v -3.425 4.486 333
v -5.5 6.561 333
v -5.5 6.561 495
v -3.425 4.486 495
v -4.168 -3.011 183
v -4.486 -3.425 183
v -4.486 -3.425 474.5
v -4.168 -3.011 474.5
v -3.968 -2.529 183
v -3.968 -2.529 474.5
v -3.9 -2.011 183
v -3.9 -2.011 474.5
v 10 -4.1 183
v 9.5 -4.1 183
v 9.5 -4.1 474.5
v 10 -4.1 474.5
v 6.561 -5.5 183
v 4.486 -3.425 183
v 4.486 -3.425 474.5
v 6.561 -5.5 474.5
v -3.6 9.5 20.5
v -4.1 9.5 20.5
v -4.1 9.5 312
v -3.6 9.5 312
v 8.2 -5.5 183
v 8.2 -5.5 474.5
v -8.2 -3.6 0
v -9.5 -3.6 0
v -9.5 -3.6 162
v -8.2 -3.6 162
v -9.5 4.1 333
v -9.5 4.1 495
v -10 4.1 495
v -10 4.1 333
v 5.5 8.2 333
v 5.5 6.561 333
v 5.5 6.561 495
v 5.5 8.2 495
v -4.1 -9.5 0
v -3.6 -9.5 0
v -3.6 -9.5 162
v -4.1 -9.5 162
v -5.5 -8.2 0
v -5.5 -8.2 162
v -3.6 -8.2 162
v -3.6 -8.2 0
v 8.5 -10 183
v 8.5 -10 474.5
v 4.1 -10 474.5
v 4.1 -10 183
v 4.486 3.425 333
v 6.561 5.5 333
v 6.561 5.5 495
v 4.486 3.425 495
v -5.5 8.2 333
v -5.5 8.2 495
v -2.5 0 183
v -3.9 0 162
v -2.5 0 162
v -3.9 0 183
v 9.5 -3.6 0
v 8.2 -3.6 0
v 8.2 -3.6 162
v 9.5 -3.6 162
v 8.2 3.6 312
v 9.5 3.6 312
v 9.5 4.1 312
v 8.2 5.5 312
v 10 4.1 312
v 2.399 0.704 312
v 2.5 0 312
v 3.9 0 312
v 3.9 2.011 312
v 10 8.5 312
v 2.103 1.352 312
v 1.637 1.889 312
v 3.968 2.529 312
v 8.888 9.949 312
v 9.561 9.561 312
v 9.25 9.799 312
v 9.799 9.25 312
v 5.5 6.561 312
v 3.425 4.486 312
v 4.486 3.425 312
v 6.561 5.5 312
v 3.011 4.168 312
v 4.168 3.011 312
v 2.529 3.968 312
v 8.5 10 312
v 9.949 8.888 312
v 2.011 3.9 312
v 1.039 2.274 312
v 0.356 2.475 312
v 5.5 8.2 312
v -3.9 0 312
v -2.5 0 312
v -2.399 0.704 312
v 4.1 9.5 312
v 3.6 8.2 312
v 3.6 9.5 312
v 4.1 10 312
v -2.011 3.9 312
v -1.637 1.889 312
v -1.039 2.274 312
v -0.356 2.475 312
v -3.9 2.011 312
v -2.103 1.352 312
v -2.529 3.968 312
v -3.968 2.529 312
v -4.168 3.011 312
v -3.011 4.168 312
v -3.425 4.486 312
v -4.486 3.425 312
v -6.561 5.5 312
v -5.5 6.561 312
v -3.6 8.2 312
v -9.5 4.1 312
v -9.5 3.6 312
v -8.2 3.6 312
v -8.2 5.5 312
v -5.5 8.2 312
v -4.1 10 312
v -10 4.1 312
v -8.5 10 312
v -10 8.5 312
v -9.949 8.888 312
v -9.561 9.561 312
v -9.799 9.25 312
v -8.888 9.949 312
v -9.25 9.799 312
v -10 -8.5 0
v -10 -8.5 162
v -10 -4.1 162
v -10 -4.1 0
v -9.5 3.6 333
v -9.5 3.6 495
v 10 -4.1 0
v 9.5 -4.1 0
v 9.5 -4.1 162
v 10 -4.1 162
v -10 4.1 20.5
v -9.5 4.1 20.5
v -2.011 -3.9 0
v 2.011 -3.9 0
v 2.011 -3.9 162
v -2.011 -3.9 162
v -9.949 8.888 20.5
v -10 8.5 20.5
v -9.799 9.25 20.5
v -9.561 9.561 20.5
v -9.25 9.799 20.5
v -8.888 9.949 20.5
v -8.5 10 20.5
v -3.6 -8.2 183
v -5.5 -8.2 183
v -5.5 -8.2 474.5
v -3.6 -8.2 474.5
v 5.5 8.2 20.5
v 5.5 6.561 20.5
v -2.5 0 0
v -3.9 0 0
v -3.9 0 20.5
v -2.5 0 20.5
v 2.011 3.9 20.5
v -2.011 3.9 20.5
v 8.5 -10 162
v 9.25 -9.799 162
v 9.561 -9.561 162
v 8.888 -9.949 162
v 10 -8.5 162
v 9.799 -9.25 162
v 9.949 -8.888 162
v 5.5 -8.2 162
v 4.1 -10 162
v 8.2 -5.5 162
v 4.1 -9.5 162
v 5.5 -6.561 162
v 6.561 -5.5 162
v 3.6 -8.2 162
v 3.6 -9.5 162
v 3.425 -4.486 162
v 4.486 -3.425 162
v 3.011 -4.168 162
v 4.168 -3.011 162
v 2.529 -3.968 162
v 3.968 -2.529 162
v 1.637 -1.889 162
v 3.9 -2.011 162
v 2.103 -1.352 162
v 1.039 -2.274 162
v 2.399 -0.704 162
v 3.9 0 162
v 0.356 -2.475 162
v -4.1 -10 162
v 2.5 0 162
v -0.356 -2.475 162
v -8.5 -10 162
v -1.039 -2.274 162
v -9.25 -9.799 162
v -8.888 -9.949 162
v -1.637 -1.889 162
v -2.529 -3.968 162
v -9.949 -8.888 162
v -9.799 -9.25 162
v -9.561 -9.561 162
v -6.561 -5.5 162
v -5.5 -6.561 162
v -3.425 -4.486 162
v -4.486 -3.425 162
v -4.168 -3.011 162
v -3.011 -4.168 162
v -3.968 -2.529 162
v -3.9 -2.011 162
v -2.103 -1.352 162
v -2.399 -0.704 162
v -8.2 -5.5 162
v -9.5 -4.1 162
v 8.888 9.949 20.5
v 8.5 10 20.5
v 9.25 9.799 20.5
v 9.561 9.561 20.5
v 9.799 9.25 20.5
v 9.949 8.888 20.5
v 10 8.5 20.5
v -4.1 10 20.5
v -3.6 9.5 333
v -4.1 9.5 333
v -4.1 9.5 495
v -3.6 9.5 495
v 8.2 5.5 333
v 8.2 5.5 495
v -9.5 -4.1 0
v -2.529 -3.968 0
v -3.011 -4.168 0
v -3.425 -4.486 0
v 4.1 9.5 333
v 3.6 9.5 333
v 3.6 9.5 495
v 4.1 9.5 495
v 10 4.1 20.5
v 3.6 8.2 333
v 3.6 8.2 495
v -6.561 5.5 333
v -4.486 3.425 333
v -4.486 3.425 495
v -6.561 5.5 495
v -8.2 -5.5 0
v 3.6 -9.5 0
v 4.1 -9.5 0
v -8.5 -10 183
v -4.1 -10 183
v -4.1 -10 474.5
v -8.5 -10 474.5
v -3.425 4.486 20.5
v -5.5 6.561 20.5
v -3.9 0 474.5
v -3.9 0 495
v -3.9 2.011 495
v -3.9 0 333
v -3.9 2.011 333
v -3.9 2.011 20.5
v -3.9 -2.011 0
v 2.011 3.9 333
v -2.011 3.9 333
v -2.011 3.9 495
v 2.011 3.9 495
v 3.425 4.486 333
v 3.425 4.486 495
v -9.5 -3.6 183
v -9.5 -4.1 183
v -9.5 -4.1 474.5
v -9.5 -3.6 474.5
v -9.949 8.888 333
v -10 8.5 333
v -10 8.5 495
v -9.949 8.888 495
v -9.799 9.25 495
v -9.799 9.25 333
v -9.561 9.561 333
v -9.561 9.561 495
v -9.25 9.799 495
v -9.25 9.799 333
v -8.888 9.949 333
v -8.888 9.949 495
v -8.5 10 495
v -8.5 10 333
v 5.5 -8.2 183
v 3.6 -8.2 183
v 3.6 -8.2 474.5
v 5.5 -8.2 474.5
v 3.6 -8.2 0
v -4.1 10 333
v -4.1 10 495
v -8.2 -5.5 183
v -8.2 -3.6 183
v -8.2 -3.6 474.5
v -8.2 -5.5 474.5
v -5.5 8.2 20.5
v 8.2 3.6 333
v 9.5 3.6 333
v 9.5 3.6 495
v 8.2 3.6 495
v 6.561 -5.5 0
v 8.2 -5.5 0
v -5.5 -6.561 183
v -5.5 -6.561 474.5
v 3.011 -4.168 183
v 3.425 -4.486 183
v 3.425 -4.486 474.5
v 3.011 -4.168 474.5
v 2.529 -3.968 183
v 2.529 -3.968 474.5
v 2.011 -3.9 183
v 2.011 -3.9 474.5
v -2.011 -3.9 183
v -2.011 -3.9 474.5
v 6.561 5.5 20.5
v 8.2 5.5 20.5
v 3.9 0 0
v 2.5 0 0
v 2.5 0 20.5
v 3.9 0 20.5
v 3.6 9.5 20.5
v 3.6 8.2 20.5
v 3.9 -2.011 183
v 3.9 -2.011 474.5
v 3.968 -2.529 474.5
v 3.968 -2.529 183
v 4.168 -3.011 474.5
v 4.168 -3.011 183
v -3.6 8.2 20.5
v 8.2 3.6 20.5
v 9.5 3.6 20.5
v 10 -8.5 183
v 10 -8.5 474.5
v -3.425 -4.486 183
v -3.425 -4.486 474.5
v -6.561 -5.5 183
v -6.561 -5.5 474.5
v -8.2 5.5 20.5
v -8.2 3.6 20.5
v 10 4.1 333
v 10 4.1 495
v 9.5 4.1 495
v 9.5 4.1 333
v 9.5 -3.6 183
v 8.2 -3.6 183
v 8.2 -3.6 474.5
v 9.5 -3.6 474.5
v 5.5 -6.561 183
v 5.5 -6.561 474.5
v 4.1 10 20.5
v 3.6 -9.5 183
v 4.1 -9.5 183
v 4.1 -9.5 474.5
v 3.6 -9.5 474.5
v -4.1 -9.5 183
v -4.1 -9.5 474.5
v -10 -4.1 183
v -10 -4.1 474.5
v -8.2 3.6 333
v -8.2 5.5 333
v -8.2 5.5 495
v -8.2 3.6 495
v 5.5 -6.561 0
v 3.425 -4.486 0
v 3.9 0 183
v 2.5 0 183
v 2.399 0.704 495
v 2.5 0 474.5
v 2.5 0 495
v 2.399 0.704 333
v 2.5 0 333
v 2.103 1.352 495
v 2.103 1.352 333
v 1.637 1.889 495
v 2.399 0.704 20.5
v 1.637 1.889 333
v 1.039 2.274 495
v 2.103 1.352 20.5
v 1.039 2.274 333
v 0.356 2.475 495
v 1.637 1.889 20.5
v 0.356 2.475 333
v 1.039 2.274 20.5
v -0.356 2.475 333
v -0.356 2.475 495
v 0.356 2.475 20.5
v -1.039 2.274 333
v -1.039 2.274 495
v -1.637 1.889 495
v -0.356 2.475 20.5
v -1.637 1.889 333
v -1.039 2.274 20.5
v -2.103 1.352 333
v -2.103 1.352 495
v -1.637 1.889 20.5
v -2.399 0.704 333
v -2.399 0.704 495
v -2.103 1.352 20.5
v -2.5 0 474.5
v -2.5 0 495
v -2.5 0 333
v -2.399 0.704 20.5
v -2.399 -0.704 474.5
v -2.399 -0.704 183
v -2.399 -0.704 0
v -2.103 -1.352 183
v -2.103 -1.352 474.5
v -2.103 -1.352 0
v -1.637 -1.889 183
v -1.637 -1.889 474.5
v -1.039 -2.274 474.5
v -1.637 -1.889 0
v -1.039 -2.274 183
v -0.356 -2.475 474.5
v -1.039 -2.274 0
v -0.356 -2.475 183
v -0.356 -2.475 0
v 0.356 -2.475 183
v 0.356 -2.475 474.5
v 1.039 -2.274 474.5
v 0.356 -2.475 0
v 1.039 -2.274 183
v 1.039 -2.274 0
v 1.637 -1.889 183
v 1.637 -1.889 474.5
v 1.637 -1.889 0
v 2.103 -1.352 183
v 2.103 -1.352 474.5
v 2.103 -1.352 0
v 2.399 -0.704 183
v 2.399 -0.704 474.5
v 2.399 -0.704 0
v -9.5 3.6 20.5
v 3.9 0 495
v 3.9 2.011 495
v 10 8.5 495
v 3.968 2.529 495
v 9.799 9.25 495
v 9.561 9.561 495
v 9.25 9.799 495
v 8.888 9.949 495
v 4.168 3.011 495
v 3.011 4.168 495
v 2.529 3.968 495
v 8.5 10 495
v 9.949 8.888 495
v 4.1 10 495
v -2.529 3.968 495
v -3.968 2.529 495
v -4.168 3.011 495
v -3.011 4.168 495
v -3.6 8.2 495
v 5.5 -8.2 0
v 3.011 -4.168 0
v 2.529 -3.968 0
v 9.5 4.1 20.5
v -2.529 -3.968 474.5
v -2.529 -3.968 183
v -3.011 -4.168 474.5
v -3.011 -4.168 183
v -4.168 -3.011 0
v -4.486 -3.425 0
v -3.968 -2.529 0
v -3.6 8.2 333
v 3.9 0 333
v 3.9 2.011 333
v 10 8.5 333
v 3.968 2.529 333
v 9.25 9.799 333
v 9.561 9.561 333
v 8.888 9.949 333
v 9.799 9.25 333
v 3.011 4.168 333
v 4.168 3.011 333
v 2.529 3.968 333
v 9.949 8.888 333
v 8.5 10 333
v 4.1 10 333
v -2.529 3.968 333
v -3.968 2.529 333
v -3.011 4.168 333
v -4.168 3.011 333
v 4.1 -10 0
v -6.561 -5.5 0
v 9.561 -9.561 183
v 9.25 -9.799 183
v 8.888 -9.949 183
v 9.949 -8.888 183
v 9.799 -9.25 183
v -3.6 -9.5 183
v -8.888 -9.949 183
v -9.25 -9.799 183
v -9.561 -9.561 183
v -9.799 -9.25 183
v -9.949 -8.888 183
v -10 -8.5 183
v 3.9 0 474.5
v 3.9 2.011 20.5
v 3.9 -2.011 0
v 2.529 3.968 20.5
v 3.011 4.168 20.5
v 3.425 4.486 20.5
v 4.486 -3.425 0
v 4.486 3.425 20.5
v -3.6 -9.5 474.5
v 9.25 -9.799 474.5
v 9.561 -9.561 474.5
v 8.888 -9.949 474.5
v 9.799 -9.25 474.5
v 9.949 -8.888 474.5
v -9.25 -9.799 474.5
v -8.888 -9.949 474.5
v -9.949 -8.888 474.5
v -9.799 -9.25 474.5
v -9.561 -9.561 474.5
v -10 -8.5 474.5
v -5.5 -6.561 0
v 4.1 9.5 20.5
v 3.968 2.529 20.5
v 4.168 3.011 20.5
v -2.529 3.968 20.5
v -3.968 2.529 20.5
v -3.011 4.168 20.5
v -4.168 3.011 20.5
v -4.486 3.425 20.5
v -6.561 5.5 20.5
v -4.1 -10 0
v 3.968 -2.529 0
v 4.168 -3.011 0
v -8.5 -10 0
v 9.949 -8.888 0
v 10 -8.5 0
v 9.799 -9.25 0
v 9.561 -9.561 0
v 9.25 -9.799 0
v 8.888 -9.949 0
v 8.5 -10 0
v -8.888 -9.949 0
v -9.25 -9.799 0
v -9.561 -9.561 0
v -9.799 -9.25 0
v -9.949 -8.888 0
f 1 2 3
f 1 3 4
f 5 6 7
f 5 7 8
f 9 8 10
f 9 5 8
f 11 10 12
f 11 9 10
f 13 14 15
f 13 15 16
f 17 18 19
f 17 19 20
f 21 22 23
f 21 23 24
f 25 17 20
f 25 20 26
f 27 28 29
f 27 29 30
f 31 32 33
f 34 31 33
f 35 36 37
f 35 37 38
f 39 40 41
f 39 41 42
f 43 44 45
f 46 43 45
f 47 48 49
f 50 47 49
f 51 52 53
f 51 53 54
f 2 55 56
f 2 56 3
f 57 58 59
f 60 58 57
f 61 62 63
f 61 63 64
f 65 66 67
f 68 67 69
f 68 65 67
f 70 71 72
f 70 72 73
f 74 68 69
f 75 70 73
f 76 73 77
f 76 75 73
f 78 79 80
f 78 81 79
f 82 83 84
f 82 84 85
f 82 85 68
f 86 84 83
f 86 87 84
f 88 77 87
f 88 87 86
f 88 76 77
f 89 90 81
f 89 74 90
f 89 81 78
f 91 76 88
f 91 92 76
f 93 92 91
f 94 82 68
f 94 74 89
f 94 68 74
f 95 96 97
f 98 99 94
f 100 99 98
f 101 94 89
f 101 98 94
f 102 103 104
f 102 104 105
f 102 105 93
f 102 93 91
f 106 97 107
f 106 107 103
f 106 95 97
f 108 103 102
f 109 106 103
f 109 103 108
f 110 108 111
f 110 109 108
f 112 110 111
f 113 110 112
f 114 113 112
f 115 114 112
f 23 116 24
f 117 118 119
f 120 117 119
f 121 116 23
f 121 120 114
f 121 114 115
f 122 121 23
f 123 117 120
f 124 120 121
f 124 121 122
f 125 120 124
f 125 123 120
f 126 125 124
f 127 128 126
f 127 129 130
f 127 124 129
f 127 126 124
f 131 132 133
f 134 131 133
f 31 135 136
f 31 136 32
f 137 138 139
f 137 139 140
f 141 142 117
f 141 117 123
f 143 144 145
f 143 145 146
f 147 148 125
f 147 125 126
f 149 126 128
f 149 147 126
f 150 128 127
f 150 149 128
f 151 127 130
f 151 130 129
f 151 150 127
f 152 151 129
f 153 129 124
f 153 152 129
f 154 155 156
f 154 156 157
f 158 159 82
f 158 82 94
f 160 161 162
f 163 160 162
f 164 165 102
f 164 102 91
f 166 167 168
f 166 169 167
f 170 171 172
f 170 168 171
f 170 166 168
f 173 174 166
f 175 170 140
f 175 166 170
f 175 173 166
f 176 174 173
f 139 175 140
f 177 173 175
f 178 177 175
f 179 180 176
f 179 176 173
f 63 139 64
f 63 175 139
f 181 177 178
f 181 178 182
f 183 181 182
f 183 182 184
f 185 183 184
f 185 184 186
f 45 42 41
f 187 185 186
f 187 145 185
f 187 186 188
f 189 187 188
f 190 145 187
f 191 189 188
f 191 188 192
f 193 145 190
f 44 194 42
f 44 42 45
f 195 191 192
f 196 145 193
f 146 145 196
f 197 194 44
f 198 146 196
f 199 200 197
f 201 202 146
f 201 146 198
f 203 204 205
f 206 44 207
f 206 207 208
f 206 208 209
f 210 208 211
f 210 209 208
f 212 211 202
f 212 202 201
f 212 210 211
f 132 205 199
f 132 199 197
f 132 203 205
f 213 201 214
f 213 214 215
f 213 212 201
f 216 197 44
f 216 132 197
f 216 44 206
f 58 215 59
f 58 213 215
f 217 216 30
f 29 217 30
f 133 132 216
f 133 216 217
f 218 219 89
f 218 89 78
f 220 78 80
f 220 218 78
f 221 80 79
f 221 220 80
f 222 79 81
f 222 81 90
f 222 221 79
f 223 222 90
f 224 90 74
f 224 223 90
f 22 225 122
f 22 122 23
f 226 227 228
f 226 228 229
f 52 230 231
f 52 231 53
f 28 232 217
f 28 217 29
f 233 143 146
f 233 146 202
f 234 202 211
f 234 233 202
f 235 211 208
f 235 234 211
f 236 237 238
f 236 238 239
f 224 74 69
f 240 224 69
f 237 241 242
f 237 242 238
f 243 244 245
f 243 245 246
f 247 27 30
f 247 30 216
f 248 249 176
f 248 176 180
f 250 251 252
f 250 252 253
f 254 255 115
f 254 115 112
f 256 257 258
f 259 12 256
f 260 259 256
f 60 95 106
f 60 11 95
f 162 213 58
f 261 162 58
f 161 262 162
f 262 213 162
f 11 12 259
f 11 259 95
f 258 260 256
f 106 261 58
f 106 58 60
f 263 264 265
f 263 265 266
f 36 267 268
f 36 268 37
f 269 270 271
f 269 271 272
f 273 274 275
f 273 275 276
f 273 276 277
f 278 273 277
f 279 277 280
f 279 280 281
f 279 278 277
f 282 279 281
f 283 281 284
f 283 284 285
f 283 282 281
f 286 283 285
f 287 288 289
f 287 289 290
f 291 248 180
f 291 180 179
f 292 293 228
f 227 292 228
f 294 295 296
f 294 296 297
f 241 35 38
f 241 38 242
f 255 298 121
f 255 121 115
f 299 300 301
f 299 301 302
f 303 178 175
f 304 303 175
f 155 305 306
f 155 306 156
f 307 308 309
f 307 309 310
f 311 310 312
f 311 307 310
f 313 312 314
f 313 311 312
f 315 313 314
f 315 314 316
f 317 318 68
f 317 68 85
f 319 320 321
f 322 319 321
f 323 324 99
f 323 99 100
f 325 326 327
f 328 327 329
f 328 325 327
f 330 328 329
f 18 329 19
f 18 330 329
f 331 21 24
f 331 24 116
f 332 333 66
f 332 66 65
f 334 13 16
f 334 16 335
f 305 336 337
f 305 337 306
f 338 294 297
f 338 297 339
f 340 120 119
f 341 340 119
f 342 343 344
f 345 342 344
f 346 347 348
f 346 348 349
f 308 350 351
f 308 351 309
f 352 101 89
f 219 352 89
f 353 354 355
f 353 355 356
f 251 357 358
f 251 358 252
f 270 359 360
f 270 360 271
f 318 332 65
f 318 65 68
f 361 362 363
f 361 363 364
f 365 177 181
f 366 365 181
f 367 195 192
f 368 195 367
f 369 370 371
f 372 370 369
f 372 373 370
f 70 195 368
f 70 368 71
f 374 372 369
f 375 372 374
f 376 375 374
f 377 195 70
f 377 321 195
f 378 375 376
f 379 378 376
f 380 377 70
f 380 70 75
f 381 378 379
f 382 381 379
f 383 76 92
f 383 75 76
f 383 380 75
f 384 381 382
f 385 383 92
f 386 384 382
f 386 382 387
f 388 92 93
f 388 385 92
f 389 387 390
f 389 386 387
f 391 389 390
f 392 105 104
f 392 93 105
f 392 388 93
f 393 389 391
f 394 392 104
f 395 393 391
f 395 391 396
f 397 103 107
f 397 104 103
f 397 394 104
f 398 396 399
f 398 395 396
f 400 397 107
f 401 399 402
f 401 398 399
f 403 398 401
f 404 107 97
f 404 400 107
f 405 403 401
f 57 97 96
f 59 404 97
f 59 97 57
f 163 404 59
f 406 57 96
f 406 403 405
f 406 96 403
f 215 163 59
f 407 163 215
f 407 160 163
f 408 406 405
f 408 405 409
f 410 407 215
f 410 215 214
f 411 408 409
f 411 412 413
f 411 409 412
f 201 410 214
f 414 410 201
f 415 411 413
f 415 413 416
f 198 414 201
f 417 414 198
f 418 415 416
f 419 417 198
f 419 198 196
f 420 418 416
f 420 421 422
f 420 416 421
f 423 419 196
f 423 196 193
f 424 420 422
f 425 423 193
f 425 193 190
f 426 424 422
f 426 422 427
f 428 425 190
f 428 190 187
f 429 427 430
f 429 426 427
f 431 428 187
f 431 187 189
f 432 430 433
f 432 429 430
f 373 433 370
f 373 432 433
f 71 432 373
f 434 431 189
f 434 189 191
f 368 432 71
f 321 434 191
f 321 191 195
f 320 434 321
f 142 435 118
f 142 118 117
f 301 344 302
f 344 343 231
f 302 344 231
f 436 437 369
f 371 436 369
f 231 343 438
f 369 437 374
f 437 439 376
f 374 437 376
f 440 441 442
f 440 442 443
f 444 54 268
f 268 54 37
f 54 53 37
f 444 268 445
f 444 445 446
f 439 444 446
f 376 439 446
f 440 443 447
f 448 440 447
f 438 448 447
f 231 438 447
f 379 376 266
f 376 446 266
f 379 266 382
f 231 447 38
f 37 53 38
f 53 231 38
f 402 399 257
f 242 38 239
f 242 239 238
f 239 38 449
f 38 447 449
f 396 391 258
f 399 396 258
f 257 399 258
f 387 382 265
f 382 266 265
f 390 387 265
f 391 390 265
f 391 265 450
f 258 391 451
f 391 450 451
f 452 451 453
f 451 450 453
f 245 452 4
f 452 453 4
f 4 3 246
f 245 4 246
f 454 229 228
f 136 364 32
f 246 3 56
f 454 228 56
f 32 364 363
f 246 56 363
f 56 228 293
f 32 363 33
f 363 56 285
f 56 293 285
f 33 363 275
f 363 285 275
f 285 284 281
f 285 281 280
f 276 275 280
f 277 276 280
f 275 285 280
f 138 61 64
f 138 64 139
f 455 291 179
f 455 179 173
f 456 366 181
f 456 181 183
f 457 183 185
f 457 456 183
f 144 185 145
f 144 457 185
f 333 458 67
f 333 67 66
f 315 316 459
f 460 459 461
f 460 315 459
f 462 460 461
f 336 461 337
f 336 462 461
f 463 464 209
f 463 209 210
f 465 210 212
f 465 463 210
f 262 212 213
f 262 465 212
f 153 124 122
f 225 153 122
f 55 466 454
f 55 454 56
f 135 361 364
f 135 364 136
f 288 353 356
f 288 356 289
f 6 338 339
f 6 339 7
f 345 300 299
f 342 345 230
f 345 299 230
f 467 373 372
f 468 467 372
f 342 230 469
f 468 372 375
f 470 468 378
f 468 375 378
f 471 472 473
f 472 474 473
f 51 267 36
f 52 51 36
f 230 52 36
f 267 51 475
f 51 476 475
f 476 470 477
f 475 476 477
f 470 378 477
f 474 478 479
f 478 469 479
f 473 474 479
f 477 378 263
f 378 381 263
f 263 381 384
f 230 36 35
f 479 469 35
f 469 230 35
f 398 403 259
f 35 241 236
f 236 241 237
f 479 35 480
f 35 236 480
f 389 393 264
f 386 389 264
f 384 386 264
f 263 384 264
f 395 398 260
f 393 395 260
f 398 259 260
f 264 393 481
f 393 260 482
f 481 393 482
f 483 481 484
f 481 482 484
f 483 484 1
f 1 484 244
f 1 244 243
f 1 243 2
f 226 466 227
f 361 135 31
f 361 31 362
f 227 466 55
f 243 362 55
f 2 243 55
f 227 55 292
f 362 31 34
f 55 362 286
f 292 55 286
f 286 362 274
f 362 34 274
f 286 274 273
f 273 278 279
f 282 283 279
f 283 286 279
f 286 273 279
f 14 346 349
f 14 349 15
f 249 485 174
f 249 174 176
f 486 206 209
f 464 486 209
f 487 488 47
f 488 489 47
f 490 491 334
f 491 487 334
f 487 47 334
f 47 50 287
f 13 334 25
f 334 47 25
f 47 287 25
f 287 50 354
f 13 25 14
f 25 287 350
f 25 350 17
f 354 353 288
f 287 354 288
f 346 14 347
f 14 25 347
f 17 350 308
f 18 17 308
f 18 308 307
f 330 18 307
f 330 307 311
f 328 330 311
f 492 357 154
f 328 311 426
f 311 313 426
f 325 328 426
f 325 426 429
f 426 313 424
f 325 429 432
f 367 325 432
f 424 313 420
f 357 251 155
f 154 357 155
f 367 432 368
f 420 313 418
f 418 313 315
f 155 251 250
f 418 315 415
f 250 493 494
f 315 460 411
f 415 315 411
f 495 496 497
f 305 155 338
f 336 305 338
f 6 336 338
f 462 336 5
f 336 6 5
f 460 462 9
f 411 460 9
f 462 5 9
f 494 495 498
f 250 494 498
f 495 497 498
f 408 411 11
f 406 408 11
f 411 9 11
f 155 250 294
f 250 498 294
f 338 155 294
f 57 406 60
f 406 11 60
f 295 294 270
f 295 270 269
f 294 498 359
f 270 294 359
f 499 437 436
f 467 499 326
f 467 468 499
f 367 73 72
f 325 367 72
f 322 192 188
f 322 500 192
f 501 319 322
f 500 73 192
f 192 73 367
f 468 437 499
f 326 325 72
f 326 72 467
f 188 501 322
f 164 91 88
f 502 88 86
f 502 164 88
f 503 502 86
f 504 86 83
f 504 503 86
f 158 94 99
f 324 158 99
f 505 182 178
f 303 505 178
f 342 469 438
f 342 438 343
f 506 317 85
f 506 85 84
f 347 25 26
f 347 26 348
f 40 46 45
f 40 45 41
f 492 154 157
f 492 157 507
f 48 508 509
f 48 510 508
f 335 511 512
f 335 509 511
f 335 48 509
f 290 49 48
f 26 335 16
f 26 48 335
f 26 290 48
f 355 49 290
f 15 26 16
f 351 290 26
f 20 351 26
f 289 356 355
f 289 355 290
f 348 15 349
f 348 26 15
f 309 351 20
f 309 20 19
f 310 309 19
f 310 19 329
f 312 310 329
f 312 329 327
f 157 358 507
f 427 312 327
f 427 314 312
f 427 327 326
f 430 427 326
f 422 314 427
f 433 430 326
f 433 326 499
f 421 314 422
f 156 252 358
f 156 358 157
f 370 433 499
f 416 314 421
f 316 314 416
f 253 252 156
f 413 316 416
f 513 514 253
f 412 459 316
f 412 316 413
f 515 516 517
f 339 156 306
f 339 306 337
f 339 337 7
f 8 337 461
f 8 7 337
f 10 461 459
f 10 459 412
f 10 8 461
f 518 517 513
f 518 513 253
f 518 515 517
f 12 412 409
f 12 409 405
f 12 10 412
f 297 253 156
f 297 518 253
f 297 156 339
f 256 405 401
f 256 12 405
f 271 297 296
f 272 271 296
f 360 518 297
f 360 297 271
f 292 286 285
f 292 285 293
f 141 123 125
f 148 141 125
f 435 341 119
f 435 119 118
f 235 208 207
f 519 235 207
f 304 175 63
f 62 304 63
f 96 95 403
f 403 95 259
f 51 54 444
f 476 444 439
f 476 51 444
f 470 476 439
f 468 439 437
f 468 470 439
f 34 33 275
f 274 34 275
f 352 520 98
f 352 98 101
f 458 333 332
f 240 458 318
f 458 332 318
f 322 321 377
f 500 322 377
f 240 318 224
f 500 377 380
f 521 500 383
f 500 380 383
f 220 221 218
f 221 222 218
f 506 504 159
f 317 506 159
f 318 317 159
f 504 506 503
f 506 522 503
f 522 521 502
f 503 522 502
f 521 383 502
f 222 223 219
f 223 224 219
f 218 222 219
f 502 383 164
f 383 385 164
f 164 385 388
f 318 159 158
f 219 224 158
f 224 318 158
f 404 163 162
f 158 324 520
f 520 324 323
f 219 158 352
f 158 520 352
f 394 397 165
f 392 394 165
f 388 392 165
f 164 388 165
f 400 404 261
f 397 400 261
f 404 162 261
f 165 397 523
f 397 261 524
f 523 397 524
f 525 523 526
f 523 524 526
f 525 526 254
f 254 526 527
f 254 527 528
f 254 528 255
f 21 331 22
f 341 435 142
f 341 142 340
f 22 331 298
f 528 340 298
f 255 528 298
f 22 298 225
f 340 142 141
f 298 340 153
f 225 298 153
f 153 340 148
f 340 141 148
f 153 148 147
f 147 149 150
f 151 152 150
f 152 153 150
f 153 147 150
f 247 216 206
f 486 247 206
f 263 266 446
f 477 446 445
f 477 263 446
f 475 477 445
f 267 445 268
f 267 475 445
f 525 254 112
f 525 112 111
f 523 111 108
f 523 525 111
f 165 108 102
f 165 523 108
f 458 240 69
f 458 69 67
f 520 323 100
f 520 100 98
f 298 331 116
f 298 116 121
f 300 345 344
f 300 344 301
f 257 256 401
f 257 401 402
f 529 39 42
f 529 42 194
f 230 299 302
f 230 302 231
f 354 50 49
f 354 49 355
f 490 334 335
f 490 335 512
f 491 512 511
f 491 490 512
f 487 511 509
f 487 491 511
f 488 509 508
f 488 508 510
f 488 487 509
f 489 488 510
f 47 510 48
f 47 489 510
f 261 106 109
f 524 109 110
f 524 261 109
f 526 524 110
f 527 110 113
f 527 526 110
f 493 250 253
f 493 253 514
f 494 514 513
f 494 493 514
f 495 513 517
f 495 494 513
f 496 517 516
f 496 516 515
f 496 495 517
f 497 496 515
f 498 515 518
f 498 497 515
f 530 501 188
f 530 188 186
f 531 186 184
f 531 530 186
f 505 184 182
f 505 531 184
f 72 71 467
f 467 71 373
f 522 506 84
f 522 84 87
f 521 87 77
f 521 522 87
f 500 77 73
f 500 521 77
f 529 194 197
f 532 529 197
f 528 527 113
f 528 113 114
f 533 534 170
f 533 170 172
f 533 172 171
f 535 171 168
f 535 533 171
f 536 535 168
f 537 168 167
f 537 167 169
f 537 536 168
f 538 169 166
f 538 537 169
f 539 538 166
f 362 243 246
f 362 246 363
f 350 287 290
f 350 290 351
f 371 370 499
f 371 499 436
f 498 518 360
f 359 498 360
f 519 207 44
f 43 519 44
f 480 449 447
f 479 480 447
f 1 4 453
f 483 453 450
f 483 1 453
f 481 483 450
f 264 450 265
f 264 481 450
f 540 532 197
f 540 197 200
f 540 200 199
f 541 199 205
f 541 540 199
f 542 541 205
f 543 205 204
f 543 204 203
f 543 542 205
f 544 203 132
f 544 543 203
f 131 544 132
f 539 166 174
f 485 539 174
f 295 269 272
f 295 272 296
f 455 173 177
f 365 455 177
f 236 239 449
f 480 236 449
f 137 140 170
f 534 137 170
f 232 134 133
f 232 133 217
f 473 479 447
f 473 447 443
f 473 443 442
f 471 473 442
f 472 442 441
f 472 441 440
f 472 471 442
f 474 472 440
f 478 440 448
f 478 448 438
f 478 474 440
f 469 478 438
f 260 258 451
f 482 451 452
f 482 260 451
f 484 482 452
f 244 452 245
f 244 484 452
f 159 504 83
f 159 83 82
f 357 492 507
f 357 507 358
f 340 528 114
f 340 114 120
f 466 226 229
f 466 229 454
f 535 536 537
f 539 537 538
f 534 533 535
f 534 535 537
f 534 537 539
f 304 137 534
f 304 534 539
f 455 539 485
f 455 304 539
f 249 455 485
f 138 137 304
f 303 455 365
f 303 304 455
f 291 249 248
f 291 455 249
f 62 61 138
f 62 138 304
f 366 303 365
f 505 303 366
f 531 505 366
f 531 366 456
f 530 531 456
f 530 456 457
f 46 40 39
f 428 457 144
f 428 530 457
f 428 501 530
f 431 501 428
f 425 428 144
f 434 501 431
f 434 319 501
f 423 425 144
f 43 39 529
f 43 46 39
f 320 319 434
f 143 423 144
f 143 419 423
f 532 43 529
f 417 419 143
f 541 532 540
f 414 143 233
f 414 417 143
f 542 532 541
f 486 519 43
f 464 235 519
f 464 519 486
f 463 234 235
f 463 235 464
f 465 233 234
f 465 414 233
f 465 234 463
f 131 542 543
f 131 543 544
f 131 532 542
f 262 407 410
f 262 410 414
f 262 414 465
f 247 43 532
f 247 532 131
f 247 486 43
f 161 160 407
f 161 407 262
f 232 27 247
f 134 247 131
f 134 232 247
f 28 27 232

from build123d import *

# Parameters (mm, degrees)
SKETCH1_R           = 2.5
BOSS_EXTRUDE2_DEPTH = 495
SKETCH_1_W          = 21
SKETCH_1_H          = 10
SKETCH_1_W_2        = 20.5
CUT_EXTRUDE_1_DEPTH = 496.504793115


with BuildPart() as part:
    # Sketch1 → Boss-Extrude2 (new body)
    with BuildSketch(Plane.XY):
        with BuildLine():
            Line((10, -4.1), (10, -8.5))
            ThreePointArc((10, -8.5), (9.560660172, -9.560660172), (8.5, -10))
            Line((8.5, -10), (4.1, -10))
            Line((4.1, -10), (4.1, -9.5))
            Line((4.1, -9.5), (3.6, -9.5))
            Line((3.6, -9.5), (3.6, -8.2))
            Line((3.6, -8.2), (5.5, -8.2))
            Line((5.5, -8.2), (5.5, -6.560660172))
            Line((5.5, -6.560660172), (3.425126266, -4.485786438))
            ThreePointArc((3.425126266, -4.485786438), (2.776279568, -4.052240935), (2.010912703, -3.9))
            Line((2.010912703, -3.9), (-2.010912703, -3.9))
            ThreePointArc((-2.010912703, -3.9), (-2.776279568, -4.052240935), (-3.425126266, -4.485786438))
            Line((-3.425126266, -4.485786438), (-5.5, -6.560660172))
            Line((-5.5, -6.560660172), (-5.5, -8.2))
            Line((-5.5, -8.2), (-3.6, -8.2))
            Line((-3.6, -8.2), (-3.6, -9.5))
            Line((-3.6, -9.5), (-4.1, -9.5))
            Line((-4.1, -9.5), (-4.1, -10))
            Line((-4.1, -10), (-8.5, -10))
            ThreePointArc((-8.5, -10), (-9.560660172, -9.560660172), (-10, -8.5))
            Line((-10, -8.5), (-10, -4.1))
            Line((-10, -4.1), (-9.5, -4.1))
            Line((-9.5, -4.1), (-9.5, -3.6))
            Line((-9.5, -3.6), (-8.2, -3.6))
            Line((-8.2, -3.6), (-8.2, -5.5))
            Line((-8.2, -5.5), (-6.560660172, -5.5))
            Line((-6.560660172, -5.5), (-4.485786438, -3.425126266))
            ThreePointArc((-4.485786438, -3.425126266), (-4.052240935, -2.776279568), (-3.9, -2.010912703))
            Line((-3.9, -2.010912703), (-3.9, 2.010912703))
            ThreePointArc((-3.9, 2.010912703), (-4.052240935, 2.776279568), (-4.485786438, 3.425126266))
            Line((-4.485786438, 3.425126266), (-6.560660172, 5.5))
            Line((-6.560660172, 5.5), (-8.2, 5.5))
            Line((-8.2, 5.5), (-8.2, 3.6))
            Line((-8.2, 3.6), (-9.5, 3.6))
            Line((-9.5, 3.6), (-9.5, 4.1))
            Line((-9.5, 4.1), (-10, 4.1))
            Line((-10, 4.1), (-10, 8.5))
            ThreePointArc((-10, 8.5), (-9.560660172, 9.560660172), (-8.5, 10))
            Line((-8.5, 10), (-4.1, 10))
            Line((-4.1, 10), (-4.1, 9.5))
            Line((-4.1, 9.5), (-3.6, 9.5))
            Line((-3.6, 9.5), (-3.6, 8.2))
            Line((-3.6, 8.2), (-5.5, 8.2))
            Line((-5.5, 8.2), (-5.5, 6.560660172))
            Line((-5.5, 6.560660172), (-3.425126266, 4.485786438))
            ThreePointArc((-3.425126266, 4.485786438), (-2.776279568, 4.052240935), (-2.010912703, 3.9))
            Line((-2.010912703, 3.9), (2.010912703, 3.9))
            ThreePointArc((2.010912703, 3.9), (2.776279568, 4.052240935), (3.425126266, 4.485786438))
            Line((3.425126266, 4.485786438), (5.5, 6.560660172))
            Line((5.5, 6.560660172), (5.5, 8.2))
            Line((5.5, 8.2), (3.6, 8.2))
            Line((3.6, 8.2), (3.6, 9.5))
            Line((3.6, 9.5), (4.1, 9.5))
            Line((4.1, 9.5), (4.1, 10))
            Line((4.1, 10), (8.5, 10))
            ThreePointArc((8.5, 10), (9.560660172, 9.560660172), (10, 8.5))
            Line((10, 8.5), (10, 4.1))
            Line((10, 4.1), (9.5, 4.1))
            Line((9.5, 4.1), (9.5, 3.6))
            Line((9.5, 3.6), (8.2, 3.6))
            Line((8.2, 3.6), (8.2, 5.5))
            Line((8.2, 5.5), (6.560660172, 5.5))
            Line((6.560660172, 5.5), (4.485786438, 3.425126266))
            ThreePointArc((4.485786438, 3.425126266), (4.052240935, 2.776279568), (3.9, 2.010912703))
            Line((3.9, 2.010912703), (3.9, -2.010912703))
            ThreePointArc((3.9, -2.010912703), (4.052240935, -2.776279568), (4.485786438, -3.425126266))
            Line((4.485786438, -3.425126266), (6.560660172, -5.5))
            Line((6.560660172, -5.5), (8.2, -5.5))
            Line((8.2, -5.5), (8.2, -3.6))
            Line((8.2, -3.6), (9.5, -3.6))
            Line((9.5, -3.6), (9.5, -4.1))
            Line((9.5, -4.1), (10, -4.1))
        make_face()
        Circle(SKETCH1_R, mode=Mode.SUBTRACT)
    extrude(amount=BOSS_EXTRUDE2_DEPTH)

    # ｽｹｯﾁ1 → ｶｯﾄ - 押し出し1 (cut, through all)
    with BuildSketch(Plane.ZY.offset(10)):
        with Locations((172.5, -5)):
            Rectangle(SKETCH_1_W, SKETCH_1_H)
        with Locations((10.25, 5)):
            Rectangle(SKETCH_1_W_2, SKETCH_1_H)
        with Locations((484.75, -5)):
            Rectangle(SKETCH_1_W_2, SKETCH_1_H)
        with Locations((322.5, 5)):
            Rectangle(SKETCH_1_W, SKETCH_1_H)
    extrude(amount=-CUT_EXTRUDE_1_DEPTH, mode=Mode.SUBTRACT)


solid = part.part
